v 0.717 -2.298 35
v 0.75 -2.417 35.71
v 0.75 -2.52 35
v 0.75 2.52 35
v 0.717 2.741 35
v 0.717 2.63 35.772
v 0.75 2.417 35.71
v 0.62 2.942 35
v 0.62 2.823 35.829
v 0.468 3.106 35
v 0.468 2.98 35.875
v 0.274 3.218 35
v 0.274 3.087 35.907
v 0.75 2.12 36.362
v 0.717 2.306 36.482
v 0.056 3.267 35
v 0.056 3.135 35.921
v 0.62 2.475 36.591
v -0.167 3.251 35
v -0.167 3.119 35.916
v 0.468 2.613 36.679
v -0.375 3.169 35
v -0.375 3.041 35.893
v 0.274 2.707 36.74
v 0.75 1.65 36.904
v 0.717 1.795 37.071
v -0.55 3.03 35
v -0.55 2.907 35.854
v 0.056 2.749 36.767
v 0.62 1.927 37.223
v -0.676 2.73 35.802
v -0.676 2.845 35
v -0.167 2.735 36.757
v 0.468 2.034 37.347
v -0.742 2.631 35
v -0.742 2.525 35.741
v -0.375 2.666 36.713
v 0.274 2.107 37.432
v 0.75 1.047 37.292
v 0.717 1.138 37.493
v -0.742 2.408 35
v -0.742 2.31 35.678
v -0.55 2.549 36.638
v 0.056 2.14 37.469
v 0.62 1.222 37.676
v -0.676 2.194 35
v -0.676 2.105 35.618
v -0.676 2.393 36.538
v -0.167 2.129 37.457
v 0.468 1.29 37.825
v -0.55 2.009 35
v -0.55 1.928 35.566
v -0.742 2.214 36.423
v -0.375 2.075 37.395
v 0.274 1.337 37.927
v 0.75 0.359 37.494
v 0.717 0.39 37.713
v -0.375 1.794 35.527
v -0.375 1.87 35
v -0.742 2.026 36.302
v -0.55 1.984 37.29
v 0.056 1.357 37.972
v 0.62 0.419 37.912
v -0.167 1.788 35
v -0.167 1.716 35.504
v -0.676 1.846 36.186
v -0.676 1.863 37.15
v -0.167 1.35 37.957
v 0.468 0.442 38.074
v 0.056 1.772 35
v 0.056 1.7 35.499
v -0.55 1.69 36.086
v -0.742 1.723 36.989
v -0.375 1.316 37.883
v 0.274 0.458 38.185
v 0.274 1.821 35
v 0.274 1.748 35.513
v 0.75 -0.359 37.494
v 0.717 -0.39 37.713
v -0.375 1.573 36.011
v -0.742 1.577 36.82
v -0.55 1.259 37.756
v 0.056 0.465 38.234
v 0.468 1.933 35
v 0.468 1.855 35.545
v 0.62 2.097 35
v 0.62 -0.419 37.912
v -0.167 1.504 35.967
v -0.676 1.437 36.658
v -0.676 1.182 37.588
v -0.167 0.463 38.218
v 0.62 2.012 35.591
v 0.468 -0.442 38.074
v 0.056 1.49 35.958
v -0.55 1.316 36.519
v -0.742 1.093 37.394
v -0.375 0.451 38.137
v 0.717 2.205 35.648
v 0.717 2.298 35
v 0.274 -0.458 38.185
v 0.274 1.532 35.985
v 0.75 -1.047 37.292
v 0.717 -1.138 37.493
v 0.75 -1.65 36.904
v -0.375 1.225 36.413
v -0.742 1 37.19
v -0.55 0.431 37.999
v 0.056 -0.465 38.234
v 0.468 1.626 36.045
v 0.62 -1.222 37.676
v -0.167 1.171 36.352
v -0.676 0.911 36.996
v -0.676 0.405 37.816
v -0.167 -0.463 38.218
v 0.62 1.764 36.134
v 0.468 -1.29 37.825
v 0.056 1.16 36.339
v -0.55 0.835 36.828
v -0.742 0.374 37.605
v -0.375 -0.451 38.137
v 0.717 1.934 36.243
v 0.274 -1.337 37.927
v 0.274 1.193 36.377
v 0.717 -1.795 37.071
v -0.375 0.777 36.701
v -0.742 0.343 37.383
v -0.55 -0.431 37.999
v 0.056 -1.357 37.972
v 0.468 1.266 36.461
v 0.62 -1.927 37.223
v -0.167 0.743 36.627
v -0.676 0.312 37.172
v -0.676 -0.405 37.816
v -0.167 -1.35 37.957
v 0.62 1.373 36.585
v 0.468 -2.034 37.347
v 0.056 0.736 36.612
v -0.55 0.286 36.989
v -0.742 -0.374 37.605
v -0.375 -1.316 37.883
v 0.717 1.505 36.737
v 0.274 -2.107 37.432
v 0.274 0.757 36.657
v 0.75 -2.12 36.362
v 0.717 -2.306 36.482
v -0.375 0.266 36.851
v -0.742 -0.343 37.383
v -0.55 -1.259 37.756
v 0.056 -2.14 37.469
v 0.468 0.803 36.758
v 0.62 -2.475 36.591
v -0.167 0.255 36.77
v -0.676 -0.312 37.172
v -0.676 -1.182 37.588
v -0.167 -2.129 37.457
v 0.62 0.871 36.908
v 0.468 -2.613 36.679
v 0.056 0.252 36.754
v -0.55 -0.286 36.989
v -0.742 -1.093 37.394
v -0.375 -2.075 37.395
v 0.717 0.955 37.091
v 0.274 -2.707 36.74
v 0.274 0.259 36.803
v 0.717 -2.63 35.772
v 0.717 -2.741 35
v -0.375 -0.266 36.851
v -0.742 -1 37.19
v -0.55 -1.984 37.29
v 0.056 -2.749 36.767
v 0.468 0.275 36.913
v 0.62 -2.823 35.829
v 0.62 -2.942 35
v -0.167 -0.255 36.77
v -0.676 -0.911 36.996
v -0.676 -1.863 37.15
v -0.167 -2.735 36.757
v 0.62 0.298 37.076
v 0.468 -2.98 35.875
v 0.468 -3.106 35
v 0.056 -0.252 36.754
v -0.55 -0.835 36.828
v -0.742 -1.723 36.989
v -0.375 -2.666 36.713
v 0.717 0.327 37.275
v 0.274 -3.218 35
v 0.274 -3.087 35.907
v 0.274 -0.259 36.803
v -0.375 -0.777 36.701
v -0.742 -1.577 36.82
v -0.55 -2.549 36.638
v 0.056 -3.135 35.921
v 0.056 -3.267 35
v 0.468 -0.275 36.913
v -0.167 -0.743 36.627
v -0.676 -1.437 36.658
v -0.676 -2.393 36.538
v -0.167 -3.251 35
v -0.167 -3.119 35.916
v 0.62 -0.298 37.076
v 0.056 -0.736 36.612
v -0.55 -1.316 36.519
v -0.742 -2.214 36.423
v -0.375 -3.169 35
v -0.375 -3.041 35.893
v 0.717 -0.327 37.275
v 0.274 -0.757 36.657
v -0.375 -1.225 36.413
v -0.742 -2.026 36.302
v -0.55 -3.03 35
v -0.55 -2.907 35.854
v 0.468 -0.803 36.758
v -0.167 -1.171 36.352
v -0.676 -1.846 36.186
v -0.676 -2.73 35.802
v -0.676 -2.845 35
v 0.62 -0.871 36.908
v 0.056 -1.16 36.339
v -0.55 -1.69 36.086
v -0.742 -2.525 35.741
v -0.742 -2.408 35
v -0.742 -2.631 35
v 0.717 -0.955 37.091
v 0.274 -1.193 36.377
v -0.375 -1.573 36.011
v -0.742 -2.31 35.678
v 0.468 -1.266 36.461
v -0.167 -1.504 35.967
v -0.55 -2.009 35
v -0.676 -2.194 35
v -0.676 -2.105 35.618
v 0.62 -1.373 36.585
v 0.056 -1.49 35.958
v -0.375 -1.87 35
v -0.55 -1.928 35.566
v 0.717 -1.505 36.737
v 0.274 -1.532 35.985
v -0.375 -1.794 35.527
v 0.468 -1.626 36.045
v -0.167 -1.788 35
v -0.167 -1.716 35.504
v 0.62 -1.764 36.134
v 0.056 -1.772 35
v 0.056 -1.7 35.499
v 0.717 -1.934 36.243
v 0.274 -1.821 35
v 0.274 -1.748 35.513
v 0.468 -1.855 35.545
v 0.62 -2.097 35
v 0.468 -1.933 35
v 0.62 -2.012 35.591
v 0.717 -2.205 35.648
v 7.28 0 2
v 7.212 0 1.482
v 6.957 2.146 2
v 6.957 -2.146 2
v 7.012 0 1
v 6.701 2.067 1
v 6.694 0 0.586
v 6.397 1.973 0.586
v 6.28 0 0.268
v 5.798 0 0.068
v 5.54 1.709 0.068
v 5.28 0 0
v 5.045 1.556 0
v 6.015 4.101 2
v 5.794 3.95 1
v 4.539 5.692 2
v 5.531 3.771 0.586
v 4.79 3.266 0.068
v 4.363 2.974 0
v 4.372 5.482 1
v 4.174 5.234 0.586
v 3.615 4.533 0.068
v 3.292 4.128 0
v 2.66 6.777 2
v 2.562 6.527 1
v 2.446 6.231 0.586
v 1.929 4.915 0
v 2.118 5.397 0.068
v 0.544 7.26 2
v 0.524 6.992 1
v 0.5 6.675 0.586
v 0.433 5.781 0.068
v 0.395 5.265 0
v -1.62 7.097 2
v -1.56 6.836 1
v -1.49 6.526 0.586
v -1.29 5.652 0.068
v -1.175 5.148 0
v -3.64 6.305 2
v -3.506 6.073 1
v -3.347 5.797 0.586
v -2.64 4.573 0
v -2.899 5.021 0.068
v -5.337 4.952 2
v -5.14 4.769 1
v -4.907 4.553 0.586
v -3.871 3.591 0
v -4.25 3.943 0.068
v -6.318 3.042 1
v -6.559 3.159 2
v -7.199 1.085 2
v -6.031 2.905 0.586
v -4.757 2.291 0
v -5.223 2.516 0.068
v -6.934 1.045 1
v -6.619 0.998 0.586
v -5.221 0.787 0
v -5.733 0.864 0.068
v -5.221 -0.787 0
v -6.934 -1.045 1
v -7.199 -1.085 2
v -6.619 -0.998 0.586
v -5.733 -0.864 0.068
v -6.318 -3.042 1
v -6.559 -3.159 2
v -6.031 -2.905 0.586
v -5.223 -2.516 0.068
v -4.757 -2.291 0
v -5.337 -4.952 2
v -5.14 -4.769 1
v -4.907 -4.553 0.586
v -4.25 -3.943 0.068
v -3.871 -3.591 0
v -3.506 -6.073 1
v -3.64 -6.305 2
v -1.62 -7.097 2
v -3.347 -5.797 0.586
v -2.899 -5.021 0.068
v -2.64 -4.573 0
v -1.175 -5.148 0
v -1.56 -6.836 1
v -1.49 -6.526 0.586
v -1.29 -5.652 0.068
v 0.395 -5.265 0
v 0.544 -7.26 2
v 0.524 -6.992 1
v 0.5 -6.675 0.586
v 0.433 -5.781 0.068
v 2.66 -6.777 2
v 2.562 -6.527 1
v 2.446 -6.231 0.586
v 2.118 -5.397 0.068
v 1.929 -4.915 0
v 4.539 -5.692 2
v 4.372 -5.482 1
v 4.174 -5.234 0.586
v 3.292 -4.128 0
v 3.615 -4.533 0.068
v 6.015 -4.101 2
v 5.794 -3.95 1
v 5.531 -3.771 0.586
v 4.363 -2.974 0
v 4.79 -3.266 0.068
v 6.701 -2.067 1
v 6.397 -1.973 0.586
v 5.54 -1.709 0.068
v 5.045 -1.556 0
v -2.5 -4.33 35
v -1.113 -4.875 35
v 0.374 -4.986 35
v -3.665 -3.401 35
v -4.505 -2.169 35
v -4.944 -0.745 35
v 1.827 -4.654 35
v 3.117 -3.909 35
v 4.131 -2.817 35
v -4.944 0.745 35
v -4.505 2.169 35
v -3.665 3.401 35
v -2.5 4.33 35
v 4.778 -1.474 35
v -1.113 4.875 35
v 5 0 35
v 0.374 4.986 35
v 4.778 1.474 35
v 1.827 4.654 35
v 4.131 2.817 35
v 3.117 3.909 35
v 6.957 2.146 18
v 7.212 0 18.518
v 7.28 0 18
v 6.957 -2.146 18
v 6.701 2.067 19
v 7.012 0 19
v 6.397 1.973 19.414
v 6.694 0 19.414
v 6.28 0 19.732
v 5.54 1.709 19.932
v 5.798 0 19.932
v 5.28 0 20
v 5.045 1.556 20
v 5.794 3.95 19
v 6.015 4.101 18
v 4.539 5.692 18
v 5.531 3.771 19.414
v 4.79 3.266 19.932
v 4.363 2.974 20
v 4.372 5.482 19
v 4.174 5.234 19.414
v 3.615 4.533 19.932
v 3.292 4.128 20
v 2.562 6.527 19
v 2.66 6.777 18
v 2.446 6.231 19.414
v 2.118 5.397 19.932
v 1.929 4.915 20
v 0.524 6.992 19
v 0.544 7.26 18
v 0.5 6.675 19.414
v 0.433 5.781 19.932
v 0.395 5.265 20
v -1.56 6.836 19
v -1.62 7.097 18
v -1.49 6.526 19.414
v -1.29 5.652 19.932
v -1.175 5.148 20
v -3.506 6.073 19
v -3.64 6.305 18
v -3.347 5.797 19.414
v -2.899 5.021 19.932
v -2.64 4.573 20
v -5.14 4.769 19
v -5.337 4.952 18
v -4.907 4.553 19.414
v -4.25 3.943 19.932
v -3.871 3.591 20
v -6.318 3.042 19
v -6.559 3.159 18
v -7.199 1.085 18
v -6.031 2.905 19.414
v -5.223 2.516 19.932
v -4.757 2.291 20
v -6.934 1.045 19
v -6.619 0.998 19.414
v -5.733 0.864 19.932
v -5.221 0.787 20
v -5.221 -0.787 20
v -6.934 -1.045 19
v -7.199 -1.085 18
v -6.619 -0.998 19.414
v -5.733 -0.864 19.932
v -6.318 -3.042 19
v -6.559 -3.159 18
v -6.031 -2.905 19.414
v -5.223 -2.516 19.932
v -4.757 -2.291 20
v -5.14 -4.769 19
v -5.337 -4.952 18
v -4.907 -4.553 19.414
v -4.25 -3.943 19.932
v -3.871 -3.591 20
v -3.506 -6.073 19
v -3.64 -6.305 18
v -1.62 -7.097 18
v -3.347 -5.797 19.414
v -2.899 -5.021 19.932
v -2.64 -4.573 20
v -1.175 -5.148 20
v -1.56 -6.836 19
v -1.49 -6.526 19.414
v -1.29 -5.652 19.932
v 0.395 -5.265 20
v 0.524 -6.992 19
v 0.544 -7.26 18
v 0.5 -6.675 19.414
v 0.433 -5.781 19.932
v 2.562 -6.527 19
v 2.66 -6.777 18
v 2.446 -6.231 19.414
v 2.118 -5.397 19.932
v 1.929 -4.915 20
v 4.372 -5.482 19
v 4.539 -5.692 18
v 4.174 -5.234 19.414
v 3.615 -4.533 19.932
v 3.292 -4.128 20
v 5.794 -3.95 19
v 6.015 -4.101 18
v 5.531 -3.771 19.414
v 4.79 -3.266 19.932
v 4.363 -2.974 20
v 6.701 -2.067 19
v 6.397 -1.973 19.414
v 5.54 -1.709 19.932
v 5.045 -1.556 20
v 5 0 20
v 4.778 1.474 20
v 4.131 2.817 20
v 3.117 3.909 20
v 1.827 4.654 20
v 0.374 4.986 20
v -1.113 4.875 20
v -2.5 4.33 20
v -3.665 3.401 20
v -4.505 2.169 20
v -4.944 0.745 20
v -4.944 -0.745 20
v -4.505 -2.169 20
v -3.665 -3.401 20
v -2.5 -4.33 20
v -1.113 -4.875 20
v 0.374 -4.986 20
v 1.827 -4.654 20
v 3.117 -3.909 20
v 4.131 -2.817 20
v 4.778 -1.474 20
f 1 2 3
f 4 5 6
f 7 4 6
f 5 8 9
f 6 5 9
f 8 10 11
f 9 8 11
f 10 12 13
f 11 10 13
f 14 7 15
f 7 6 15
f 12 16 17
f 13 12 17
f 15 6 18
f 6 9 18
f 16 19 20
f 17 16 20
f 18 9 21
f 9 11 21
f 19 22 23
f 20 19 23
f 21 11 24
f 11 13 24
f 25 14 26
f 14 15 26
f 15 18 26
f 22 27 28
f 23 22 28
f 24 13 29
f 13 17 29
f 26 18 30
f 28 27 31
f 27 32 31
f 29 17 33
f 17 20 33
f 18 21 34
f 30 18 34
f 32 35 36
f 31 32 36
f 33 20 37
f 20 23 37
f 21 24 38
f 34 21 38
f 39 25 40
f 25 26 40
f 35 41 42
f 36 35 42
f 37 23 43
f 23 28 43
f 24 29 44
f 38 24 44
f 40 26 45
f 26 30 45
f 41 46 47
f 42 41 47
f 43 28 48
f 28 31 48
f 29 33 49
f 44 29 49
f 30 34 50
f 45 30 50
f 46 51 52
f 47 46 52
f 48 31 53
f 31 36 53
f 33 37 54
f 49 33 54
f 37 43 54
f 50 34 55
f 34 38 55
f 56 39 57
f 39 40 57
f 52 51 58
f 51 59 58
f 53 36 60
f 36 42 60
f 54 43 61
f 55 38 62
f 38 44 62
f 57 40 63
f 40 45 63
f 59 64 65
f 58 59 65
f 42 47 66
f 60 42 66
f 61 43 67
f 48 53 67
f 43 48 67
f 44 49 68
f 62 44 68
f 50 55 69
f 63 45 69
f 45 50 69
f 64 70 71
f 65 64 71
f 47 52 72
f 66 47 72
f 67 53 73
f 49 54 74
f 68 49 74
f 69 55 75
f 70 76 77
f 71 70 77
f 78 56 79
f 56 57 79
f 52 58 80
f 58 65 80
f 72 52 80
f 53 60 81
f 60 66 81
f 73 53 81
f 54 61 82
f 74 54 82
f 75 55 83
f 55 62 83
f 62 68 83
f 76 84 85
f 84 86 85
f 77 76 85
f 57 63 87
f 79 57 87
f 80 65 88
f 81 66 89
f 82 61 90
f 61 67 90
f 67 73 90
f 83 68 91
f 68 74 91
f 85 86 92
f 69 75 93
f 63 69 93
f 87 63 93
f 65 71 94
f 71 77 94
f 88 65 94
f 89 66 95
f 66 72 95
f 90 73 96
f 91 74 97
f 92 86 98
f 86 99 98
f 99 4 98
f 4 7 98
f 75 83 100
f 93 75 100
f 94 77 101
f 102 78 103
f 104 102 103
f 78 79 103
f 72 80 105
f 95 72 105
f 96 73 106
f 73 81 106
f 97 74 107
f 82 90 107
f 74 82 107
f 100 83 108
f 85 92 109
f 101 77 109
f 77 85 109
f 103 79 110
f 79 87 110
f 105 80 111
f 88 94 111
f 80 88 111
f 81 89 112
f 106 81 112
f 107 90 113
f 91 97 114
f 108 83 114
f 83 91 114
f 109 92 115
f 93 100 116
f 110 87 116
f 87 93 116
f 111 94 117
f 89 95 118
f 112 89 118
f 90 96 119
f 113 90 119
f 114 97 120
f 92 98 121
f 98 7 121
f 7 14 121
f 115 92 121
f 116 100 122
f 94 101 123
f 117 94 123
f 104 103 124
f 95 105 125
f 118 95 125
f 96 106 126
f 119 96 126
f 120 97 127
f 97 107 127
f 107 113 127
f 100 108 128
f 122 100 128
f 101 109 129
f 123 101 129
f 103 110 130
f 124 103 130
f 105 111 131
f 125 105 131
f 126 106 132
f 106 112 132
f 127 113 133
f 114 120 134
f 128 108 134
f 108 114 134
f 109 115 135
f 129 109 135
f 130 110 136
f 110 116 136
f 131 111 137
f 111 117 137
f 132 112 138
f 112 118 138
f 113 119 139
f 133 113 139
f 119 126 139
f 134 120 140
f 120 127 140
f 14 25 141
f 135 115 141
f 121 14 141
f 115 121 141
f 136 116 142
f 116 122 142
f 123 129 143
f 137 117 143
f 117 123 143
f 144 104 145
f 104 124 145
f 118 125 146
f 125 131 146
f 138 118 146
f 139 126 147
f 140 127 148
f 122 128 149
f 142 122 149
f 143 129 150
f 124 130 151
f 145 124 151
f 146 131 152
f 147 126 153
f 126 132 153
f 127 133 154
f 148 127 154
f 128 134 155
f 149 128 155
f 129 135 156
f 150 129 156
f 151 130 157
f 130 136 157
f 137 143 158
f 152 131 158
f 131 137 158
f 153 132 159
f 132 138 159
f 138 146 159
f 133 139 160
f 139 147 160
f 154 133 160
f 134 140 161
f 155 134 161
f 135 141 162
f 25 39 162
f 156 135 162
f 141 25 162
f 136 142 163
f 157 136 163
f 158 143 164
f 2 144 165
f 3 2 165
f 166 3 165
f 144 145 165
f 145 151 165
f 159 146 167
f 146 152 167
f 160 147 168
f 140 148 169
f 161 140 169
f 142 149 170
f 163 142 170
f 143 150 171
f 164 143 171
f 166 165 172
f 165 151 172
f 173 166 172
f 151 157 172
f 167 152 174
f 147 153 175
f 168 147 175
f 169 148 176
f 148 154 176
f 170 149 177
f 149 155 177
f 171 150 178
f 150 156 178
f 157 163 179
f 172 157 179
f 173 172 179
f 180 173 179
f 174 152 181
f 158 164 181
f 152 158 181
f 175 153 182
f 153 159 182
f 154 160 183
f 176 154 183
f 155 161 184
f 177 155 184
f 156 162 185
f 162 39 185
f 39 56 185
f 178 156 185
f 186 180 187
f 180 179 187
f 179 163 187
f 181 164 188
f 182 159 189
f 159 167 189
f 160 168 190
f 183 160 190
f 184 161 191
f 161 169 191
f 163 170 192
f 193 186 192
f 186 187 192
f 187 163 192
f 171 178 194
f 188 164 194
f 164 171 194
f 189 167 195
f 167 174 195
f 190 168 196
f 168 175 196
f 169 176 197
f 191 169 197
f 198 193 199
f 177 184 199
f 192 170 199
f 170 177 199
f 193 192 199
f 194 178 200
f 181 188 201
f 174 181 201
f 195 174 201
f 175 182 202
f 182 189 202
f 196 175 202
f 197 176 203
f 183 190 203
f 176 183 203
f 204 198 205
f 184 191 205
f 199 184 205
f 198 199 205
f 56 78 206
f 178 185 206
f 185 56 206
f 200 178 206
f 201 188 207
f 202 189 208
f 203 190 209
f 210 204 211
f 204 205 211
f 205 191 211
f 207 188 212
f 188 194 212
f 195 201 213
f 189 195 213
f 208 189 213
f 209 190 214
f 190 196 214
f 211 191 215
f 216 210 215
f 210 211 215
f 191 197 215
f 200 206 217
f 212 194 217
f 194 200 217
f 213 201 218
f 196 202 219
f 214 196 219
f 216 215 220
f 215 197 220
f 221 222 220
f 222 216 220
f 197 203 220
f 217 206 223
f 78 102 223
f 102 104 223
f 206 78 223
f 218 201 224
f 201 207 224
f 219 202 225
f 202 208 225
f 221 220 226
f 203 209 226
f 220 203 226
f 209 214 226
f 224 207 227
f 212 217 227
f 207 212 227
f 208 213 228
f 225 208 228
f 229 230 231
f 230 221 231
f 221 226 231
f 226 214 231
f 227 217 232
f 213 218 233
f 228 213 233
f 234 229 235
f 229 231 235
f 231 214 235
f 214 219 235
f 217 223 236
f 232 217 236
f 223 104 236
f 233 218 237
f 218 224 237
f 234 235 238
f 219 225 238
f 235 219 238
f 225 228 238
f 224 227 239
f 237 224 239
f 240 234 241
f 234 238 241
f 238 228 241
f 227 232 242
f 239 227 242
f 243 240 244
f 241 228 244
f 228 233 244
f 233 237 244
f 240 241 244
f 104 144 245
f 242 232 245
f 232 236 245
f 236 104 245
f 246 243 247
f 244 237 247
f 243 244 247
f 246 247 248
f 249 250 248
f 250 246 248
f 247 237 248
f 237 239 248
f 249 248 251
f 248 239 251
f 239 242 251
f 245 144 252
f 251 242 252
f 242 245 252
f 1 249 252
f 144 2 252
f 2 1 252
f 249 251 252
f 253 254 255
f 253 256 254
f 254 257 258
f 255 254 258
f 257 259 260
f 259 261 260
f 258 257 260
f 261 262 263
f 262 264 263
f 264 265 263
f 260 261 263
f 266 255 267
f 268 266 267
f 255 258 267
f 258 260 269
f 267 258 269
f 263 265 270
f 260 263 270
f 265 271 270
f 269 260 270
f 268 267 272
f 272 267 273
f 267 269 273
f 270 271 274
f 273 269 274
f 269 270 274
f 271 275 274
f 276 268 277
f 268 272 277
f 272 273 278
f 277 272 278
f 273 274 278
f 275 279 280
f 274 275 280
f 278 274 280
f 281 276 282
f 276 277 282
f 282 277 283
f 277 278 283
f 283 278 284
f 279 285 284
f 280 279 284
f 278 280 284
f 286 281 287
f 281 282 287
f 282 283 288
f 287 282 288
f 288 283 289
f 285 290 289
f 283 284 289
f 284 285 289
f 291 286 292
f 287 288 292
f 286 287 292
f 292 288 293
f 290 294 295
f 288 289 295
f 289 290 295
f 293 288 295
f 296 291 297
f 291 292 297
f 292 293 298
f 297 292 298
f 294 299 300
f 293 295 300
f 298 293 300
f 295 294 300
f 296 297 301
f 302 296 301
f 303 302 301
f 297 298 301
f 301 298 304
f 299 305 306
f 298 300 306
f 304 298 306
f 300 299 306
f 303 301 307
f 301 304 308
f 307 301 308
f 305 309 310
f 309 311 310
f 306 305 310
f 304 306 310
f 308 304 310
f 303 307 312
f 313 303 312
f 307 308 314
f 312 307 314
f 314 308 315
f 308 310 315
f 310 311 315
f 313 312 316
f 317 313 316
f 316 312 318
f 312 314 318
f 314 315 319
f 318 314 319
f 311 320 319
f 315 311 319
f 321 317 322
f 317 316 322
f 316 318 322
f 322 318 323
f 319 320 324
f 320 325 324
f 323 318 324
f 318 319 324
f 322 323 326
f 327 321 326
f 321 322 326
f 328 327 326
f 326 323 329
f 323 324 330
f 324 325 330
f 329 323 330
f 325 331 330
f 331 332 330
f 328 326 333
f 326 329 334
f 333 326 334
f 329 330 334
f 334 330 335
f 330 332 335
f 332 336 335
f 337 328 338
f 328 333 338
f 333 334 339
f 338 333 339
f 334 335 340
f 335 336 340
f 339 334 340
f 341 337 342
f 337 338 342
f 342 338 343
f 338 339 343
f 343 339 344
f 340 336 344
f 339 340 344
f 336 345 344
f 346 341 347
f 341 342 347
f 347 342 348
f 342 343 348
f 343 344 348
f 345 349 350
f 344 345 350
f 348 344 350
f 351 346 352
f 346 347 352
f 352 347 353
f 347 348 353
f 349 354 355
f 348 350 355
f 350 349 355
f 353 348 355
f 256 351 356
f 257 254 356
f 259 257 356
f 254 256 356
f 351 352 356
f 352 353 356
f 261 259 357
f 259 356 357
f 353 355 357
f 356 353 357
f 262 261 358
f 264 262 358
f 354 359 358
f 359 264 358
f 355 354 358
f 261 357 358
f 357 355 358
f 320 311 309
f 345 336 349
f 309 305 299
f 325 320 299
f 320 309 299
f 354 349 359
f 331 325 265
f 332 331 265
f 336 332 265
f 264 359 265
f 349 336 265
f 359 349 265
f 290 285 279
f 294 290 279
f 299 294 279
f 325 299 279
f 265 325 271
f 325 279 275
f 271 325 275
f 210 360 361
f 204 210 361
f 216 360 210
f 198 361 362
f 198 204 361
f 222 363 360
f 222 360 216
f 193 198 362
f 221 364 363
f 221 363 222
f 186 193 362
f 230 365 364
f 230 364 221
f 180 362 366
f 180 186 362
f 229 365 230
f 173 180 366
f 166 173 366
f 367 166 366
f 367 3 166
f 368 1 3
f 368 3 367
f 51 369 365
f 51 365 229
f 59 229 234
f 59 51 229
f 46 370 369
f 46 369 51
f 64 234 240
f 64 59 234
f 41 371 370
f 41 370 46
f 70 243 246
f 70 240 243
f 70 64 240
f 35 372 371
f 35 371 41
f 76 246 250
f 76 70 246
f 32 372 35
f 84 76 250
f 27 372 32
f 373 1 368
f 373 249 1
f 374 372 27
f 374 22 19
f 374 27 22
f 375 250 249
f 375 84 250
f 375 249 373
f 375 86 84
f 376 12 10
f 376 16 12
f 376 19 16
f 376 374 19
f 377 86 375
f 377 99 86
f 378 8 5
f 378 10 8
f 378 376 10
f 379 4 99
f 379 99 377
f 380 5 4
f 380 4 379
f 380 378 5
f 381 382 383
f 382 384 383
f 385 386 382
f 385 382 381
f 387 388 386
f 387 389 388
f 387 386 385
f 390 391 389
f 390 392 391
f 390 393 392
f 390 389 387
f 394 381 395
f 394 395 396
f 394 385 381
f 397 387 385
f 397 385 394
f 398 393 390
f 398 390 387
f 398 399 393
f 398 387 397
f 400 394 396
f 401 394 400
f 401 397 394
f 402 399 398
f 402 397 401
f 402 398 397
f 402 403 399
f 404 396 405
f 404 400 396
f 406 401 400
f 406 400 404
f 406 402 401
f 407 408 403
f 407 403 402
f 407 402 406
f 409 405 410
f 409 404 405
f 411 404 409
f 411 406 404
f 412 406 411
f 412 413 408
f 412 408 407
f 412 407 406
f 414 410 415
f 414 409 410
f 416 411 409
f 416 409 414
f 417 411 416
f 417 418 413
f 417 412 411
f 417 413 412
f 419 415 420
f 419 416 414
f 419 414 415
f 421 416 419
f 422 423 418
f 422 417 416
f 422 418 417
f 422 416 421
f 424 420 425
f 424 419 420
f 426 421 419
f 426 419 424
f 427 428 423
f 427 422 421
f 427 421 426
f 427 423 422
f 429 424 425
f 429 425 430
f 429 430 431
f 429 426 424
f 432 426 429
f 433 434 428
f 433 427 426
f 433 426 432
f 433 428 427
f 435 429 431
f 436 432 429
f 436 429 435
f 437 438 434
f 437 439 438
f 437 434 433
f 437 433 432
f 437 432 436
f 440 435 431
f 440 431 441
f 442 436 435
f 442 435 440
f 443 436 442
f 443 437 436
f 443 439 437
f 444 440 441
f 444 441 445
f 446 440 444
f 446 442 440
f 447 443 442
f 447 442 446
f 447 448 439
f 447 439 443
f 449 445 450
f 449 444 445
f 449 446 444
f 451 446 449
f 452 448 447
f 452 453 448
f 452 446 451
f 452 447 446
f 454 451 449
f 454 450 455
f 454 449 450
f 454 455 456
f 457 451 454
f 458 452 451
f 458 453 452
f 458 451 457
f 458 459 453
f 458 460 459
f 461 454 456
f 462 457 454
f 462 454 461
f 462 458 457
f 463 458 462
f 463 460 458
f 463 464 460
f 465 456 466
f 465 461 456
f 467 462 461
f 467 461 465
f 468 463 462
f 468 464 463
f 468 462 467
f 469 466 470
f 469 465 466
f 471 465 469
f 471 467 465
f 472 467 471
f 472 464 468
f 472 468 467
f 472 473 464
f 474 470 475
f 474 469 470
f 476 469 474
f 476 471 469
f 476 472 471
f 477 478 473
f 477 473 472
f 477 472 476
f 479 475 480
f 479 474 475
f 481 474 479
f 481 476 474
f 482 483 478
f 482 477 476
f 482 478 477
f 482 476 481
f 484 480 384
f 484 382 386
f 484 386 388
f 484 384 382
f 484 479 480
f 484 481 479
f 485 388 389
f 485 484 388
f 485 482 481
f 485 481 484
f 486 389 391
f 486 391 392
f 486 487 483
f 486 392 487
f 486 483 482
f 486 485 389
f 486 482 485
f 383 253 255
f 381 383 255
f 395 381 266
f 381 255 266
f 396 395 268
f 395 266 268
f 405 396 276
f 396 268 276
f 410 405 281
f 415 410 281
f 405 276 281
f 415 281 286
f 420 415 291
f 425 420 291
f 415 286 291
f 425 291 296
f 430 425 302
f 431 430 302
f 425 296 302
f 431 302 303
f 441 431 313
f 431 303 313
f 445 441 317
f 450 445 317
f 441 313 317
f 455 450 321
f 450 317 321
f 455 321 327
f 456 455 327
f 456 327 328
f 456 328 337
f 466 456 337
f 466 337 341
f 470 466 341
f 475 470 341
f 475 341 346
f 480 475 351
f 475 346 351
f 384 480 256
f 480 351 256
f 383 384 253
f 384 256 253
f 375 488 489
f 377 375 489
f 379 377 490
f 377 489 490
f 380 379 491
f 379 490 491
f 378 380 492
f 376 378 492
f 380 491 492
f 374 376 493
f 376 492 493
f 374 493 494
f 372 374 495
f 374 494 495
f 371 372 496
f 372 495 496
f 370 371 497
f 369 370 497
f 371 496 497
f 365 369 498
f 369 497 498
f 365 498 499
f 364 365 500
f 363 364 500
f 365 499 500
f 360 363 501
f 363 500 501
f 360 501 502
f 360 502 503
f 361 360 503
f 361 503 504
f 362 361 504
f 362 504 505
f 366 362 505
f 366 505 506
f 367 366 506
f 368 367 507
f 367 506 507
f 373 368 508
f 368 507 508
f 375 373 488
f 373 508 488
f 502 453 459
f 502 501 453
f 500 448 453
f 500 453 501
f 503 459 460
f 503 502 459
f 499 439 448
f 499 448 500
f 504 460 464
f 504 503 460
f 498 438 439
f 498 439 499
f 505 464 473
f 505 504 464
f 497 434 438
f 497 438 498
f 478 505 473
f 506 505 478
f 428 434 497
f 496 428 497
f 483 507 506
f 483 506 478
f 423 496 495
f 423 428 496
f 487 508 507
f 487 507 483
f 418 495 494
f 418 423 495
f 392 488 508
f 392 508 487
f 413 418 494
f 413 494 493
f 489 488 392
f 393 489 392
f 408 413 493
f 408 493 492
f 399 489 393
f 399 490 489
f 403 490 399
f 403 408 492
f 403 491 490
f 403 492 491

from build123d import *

# Parameters (mm, degrees)
SKETCH1_R           = 7.28
BOSS_EXTRUDE1_DEPTH = 20
FILLET1_R           = 2
SKETCH2_R           = 5
BOSS_EXTRUDE2_DEPTH = 15
SKETCH4_R           = 0.75
REVOLVE1_ANGLE      = 200


with BuildPart() as part:
    # Sketch1 → Boss-Extrude1 (new body)
    with BuildSketch(Plane.XY):
        Circle(SKETCH1_R)
    extrude(amount=BOSS_EXTRUDE1_DEPTH)

    # Fillet1
    fillet1_edges = [part.edges().sort_by_distance(p)[0] for p in [
        (-7.28, 0, 0),
        (-7.28, 0, 20),
    ]]
    fillet(fillet1_edges, radius=FILLET1_R)

    # Sketch2 → Boss-Extrude2 (add)
    with BuildSketch(Plane.XY.offset(20)):
        Circle(SKETCH2_R)
    extrude(amount=BOSS_EXTRUDE2_DEPTH)

    # Sketch4 → Revolve1 (revolve)
    with BuildSketch(Plane.XY.offset(35)):
        with Locations((0, 2.519535337)):
            Circle(SKETCH4_R)
    revolve(axis=Axis((-4.466449007, 0, 35), (1, 0, 0)), revolution_arc=REVOLVE1_ANGLE)


solid = part.part
